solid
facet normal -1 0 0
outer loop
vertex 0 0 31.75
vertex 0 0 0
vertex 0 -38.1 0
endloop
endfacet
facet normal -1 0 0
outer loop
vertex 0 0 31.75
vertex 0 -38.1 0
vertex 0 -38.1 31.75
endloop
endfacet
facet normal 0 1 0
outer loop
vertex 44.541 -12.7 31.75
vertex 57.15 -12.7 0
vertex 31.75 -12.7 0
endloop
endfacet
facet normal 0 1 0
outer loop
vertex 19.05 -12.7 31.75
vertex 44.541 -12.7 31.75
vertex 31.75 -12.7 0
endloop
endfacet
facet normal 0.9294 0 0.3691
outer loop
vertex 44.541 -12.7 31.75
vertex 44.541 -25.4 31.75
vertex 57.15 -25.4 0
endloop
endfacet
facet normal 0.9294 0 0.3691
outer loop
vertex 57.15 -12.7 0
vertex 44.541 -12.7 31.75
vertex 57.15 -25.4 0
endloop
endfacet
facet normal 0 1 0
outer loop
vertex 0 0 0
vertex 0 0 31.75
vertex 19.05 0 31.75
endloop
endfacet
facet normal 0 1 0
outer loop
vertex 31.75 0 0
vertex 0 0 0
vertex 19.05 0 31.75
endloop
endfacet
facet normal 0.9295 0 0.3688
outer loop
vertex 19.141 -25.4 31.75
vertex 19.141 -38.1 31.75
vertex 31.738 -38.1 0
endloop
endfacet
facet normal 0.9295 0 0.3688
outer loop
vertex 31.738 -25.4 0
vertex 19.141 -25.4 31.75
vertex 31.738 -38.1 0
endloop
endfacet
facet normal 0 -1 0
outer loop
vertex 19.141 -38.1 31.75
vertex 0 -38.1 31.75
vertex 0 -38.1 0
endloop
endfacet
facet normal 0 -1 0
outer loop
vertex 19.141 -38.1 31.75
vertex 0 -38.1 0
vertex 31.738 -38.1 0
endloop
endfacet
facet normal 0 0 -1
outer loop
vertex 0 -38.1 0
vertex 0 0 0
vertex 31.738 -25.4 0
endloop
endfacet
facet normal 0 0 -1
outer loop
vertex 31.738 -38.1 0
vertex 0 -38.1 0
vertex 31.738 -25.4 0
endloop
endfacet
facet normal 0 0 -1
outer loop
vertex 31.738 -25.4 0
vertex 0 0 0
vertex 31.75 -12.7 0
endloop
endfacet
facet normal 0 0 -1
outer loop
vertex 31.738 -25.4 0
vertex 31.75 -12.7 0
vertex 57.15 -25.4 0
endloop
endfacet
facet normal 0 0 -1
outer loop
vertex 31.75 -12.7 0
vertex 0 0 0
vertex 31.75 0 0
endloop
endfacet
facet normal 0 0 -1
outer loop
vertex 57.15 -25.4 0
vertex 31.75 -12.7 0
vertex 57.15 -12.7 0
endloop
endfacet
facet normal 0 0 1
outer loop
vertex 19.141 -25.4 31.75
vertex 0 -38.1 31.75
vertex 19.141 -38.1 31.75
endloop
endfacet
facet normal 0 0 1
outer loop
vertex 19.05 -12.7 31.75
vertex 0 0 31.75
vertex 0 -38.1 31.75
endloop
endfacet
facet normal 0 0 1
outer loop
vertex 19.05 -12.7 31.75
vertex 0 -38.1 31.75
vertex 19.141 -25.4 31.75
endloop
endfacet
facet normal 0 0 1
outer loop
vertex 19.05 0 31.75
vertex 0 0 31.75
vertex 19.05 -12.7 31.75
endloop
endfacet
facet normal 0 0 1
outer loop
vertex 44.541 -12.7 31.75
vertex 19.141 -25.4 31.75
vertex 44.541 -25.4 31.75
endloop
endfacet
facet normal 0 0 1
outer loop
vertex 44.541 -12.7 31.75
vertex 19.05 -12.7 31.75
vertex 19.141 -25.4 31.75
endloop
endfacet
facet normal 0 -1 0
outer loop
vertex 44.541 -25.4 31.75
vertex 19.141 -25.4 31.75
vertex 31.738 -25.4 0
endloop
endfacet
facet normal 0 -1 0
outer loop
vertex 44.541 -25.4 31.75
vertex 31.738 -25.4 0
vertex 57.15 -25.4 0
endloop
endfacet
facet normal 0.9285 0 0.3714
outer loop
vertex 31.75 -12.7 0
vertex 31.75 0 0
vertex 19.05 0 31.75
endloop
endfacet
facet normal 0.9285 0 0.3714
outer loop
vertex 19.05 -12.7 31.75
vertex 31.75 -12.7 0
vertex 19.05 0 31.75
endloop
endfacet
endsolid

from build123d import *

# Parameters (mm, degrees)
F0_W     = 57.15
F0_H     = 31.75
F1_DEPTH = 38.1
F4_DEPTH = 177.8
F5_DEPTH = 12.7
F6_DEPTH = 12.7


with BuildPart() as f1:
    # F0 (on Front) → F1 (new body)
    with BuildSketch(Plane.XZ):
        with Locations((28.575, 15.875)):
            Rectangle(F0_W, F0_H)
    extrude(amount=F1_DEPTH)

    # F3 (on face) → F4 (cut)
    with BuildSketch(Plane.XZ.offset(38.1)):
        Polygon((57.15, 31.75), (44.541387, 31.75), (57.15, 0), align=None)
    extrude(amount=-F4_DEPTH, mode=Mode.SUBTRACT)

    # F3 (on face) → F5 (cut)
    with BuildSketch(Plane.XZ.offset(38.1)):
        Polygon((44.541387, 31.75), (19.141387, 31.75), (31.737559, 0), (57.137559, 0), (57.15, 0), align=None)
    extrude(amount=-F5_DEPTH, mode=Mode.SUBTRACT)

    # F2 (on face) → F6 (cut)
    with BuildSketch(Plane(origin=(0, 0, 0), x_dir=(-1, 0, 0), z_dir=(0, 1, 0))):
        Polygon((-31.75, 0), (-19.05, 31.75), (-57.15, 31.75), (-57.15, 0), align=None)
    extrude(amount=-F6_DEPTH, mode=Mode.SUBTRACT)


solid = f1.part
